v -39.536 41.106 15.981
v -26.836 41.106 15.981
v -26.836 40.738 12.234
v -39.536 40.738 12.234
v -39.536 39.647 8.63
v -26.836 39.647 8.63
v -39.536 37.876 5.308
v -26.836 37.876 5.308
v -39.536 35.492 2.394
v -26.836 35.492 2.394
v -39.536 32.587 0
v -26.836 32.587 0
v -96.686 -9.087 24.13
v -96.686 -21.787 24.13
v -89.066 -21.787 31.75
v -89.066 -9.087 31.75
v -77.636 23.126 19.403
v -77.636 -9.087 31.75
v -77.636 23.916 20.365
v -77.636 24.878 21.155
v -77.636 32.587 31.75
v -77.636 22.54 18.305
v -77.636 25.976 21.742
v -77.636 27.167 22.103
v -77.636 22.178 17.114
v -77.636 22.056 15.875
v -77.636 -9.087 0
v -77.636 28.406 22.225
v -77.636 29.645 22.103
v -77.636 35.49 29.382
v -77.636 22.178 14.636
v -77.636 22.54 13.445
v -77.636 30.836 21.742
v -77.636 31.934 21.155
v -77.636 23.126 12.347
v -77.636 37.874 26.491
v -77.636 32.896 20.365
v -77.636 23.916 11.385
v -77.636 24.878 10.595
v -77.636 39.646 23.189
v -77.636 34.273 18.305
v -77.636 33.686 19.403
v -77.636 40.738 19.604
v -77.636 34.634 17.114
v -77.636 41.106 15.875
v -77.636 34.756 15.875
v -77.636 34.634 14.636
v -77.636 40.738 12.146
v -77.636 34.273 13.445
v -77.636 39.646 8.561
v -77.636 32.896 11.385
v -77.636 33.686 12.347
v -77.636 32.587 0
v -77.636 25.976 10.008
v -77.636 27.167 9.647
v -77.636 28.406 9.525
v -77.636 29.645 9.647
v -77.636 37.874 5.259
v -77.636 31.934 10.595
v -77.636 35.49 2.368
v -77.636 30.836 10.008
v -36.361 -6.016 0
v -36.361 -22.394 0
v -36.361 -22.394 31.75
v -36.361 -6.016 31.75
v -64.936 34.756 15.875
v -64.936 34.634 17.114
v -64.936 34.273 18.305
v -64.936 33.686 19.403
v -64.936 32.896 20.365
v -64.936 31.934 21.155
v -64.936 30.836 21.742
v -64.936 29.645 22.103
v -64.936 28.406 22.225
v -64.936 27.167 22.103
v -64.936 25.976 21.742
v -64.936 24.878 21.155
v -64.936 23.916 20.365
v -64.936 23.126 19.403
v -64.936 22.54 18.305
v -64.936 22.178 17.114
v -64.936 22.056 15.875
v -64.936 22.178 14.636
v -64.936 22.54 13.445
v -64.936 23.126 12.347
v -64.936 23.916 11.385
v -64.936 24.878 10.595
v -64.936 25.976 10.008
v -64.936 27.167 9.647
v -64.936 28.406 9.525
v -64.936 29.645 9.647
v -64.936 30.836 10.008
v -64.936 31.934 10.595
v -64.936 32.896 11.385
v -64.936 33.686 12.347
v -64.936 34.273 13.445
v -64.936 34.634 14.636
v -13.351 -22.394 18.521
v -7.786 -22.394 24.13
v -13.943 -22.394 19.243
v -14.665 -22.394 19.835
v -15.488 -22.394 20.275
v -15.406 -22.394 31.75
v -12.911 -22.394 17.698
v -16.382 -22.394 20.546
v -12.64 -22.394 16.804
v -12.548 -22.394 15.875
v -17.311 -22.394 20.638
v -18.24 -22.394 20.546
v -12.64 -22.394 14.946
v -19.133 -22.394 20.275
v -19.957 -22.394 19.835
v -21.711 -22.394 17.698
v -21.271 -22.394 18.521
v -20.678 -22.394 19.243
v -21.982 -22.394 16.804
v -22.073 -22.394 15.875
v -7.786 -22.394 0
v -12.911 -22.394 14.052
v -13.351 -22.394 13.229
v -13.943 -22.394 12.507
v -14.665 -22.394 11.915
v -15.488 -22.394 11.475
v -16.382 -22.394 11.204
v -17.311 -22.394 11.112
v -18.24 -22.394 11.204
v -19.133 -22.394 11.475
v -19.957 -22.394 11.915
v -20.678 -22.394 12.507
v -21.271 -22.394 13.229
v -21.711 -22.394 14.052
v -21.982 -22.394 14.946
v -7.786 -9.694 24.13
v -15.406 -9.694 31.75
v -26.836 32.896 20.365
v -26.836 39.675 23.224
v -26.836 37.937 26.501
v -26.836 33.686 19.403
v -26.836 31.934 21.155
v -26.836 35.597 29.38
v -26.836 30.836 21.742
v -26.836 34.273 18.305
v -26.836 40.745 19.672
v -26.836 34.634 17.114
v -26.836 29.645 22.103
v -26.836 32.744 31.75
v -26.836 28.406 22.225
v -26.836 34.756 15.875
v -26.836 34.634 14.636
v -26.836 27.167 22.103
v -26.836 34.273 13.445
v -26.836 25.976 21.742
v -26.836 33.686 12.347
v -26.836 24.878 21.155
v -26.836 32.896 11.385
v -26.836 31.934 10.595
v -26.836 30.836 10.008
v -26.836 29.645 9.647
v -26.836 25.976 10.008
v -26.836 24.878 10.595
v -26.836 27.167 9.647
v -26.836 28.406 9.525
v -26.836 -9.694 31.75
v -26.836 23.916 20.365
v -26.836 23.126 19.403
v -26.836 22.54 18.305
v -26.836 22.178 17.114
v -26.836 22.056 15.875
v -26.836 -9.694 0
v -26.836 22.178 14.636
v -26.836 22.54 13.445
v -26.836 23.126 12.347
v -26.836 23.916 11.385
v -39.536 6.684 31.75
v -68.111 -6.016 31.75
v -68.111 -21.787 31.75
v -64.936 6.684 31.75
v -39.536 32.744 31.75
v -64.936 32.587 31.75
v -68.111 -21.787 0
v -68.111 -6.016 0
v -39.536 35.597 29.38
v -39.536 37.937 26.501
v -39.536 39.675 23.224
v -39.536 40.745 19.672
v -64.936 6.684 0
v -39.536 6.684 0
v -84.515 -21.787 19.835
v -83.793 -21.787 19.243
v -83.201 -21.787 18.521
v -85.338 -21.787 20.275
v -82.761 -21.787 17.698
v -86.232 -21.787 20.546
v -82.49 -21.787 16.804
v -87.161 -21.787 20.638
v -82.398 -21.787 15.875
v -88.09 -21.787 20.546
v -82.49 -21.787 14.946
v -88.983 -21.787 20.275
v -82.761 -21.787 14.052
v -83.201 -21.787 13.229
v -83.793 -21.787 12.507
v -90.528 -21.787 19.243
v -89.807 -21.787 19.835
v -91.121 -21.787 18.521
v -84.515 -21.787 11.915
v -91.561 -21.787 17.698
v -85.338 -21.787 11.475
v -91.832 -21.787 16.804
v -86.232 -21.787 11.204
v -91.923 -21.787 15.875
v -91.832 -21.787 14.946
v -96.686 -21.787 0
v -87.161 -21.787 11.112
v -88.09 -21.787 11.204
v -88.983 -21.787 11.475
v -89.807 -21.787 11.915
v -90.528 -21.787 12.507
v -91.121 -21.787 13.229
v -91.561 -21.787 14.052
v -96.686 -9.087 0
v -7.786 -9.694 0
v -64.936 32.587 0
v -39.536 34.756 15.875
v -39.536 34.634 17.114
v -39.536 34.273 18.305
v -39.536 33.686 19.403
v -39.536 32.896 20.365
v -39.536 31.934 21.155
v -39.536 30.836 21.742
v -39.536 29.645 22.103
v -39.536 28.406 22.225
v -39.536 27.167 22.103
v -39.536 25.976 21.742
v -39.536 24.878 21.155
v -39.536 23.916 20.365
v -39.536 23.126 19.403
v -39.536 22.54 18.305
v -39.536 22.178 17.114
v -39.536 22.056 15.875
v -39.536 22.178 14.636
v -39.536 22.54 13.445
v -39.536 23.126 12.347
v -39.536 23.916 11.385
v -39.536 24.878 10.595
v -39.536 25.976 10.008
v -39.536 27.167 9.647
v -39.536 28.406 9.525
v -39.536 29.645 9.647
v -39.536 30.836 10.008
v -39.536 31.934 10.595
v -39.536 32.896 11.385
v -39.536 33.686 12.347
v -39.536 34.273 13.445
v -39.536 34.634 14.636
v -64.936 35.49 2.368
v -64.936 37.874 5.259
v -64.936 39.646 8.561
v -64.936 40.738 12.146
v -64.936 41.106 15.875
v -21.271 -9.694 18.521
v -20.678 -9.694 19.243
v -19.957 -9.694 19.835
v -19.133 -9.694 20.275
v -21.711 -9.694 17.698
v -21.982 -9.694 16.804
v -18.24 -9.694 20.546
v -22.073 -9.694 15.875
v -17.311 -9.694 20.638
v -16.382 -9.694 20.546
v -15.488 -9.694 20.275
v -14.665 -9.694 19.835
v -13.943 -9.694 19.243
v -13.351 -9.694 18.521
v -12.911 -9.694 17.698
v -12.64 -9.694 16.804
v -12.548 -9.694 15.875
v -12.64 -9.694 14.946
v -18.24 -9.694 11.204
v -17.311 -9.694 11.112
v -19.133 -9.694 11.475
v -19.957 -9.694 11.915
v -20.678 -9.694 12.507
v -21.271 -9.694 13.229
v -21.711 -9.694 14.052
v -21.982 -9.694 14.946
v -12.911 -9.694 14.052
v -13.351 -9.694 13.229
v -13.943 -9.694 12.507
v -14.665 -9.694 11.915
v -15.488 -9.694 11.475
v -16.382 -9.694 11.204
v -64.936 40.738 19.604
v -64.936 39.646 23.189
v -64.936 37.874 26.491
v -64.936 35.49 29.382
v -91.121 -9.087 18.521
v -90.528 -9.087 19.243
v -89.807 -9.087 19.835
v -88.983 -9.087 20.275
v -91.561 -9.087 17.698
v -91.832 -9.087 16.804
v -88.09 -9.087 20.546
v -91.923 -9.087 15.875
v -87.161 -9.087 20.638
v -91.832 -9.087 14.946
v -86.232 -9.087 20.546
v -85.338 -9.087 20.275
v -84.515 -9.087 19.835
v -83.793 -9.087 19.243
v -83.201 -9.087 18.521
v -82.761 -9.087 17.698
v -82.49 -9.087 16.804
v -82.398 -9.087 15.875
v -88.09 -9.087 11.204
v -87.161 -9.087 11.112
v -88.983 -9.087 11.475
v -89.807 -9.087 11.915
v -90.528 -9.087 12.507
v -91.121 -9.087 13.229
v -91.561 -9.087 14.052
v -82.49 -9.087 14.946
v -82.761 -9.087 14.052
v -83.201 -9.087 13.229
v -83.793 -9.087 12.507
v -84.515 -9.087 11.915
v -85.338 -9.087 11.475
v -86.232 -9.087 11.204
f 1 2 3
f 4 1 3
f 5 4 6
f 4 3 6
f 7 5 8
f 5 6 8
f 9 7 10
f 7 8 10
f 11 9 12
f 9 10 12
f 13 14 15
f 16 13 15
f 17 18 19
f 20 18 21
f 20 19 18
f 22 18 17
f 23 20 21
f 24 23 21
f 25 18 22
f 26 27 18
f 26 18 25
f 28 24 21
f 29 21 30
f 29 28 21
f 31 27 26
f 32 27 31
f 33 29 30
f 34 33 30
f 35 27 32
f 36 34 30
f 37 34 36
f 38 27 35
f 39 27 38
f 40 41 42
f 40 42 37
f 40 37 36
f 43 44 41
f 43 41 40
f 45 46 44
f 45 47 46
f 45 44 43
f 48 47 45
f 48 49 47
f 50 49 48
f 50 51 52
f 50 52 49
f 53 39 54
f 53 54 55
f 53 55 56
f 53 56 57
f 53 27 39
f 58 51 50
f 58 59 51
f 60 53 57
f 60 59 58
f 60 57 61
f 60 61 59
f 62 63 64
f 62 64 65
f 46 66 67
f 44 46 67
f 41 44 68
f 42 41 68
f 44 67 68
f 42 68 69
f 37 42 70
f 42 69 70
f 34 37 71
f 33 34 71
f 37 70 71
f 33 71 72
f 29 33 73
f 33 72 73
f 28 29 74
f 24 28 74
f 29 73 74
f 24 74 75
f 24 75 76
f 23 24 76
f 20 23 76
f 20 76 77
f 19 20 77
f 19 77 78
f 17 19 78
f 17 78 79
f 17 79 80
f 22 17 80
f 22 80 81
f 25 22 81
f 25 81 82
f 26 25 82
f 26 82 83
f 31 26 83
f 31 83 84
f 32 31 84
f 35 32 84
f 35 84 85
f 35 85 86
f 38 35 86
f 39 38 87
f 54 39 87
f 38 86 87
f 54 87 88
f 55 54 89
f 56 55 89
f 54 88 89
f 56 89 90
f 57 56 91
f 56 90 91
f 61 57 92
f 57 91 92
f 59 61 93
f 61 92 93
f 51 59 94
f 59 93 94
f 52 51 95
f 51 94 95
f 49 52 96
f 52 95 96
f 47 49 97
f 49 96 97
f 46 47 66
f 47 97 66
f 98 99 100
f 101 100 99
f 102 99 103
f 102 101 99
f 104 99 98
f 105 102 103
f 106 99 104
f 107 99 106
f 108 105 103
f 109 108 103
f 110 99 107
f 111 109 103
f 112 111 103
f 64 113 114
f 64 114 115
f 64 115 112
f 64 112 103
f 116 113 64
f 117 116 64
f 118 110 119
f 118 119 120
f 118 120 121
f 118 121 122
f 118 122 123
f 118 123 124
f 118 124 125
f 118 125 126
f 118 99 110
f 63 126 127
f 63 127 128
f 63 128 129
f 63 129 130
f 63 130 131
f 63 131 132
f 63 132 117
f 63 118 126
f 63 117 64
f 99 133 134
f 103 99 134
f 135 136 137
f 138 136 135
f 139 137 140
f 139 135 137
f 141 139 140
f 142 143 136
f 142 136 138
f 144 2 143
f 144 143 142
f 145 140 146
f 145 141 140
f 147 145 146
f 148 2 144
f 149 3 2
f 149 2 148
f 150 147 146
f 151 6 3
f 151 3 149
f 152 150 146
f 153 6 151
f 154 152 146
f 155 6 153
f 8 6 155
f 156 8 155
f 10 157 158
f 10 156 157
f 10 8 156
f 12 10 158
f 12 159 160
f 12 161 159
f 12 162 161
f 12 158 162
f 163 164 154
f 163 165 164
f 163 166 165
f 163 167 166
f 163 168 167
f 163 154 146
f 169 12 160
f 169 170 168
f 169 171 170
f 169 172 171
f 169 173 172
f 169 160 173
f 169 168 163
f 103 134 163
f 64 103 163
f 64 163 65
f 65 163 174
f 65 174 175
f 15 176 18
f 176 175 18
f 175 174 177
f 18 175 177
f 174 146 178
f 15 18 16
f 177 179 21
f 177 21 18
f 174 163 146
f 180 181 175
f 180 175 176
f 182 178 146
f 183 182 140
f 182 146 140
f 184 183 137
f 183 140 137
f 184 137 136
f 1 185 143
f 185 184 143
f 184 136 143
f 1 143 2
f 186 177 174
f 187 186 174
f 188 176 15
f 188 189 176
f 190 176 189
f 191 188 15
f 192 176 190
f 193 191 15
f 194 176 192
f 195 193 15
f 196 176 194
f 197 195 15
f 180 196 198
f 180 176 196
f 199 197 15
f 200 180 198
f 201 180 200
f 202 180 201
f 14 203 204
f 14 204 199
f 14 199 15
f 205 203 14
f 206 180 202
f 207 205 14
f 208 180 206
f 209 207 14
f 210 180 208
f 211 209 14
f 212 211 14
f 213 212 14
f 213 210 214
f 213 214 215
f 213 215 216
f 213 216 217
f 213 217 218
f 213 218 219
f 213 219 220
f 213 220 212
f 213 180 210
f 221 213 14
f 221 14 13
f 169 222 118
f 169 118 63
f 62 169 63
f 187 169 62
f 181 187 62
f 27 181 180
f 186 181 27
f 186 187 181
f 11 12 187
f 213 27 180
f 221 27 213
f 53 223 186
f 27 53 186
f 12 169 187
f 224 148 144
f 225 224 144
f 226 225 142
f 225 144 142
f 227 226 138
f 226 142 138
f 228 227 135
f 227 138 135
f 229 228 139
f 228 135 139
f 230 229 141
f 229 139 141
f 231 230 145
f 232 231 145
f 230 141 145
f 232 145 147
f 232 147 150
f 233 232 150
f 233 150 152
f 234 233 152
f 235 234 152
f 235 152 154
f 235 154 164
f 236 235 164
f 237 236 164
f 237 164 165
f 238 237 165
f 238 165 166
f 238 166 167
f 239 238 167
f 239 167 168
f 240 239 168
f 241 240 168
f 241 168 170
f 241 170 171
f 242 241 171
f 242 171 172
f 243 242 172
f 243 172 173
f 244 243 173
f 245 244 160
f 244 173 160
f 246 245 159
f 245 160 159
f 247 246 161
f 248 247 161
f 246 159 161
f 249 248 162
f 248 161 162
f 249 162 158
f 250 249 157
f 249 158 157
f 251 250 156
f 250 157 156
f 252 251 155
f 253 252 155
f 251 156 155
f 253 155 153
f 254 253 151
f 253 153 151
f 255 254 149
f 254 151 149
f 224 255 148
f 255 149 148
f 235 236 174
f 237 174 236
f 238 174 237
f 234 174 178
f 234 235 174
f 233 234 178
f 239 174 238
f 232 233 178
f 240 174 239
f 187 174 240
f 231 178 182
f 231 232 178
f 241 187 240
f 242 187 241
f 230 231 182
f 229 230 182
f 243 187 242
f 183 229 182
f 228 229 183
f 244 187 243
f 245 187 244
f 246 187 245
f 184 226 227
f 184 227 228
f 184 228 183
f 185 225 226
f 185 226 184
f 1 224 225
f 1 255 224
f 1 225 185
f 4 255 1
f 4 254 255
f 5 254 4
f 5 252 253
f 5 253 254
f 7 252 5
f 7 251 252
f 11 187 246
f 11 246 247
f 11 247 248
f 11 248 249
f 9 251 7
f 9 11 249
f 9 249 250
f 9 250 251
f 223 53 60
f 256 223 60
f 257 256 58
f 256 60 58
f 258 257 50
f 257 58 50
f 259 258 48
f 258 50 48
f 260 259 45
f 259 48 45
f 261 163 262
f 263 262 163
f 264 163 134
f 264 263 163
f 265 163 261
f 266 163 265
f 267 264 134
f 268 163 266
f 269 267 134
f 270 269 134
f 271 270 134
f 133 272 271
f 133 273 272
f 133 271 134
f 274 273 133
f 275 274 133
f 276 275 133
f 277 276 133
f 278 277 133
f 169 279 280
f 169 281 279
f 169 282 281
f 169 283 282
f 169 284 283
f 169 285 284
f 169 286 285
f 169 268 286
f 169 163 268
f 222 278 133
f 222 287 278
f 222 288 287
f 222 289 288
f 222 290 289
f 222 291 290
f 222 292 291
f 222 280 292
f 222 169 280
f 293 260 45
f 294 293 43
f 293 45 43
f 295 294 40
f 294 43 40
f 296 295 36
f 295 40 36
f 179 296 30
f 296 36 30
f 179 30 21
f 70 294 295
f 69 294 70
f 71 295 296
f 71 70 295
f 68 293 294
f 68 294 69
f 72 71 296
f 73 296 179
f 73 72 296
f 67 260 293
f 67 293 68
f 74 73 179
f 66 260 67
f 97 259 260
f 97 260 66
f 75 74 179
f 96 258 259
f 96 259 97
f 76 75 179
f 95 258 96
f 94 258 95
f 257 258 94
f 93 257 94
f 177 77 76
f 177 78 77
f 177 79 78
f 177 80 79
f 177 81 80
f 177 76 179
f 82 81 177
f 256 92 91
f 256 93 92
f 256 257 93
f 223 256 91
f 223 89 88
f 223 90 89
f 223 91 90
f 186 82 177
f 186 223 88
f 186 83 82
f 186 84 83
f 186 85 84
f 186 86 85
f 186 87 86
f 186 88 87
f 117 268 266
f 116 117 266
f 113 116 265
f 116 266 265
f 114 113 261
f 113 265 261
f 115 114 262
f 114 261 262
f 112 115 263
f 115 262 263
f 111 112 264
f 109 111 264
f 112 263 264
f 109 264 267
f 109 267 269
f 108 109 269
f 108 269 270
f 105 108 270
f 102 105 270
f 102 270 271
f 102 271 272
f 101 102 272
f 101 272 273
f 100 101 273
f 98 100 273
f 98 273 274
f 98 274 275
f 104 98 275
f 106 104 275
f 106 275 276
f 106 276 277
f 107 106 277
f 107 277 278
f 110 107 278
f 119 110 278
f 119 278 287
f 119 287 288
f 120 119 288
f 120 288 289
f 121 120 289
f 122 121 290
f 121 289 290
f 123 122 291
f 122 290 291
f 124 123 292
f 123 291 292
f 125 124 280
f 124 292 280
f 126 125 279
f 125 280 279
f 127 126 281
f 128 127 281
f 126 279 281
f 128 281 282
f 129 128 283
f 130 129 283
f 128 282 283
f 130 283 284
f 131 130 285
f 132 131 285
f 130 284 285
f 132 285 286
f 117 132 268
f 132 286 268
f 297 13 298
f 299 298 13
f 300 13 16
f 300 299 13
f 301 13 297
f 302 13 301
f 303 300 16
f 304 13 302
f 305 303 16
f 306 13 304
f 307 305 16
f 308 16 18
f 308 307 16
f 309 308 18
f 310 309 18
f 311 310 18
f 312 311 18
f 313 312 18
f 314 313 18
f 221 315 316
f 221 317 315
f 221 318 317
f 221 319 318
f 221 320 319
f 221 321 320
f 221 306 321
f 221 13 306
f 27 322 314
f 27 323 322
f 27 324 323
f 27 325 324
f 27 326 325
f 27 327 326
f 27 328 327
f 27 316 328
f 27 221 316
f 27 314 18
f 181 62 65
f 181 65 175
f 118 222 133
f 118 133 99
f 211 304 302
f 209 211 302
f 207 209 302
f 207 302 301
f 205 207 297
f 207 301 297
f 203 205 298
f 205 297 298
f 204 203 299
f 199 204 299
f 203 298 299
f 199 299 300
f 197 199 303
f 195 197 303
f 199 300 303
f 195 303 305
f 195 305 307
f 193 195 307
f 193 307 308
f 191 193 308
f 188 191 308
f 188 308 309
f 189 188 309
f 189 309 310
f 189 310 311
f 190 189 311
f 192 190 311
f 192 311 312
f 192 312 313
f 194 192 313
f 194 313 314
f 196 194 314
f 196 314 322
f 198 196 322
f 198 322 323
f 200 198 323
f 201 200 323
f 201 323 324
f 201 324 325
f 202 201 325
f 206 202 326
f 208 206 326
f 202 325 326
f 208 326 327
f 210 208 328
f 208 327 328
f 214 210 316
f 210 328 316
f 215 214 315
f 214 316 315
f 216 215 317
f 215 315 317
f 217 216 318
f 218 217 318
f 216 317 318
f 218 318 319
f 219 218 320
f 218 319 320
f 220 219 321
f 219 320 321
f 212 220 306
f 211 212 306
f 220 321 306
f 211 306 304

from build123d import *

# Parameters (mm, degrees)
BOSS_EXTRUDE1_DEPTH      = 31.75
CUT_EXTRUDE2_DEPTH       = 115.012526534
CUT_EXTRUDE2_DEPTH_BACK  = 115.012526534
SKETCH4_R                = 6.35
CUT_EXTRUDE3_DEPTH       = 88.332955112
CUT_EXTRUDE13_DEPTH      = 31.75
CUT_EXTRUDE18_DEPTH      = 25.4
CUT_EXTRUDE22_DEPTH      = 88.332955112
CUT_EXTRUDE22_DEPTH_BACK = 25.4
CUT_EXTRUDE23_DEPTH      = 25.4
SKETCH14_R               = 4.7625
CUT_EXTRUDE24_DEPTH      = 114.470708815
SKETCH15_R               = 4.7625
CUT_EXTRUDE25_DEPTH      = 114.470708815


with BuildPart() as part:
    # Sketch2 → Boss-Extrude1 (new body)
    with BuildSketch(Plane.XY):
        Polygon((-77.635875696, 41.712828345), (-64.935875696, 41.712828345), (-64.935875696, 6.683574613), (-39.535875696, 6.683574613), (-39.535875696, 41.10626118), (-26.835875696, 41.10626118), (-26.835875696, -9.69373882), (-7.785875696, -9.69373882), (-7.785875696, -22.39373882), (-36.360875696, -22.39373882), (-36.360875696, -6.016425387), (-68.110875696, -6.016425387), (-68.110875696, -21.787171655), (-96.685875696, -21.787171655), (-96.685875696, -9.087171655), (-77.635875696, -9.087171655), align=None)
    extrude(amount=BOSS_EXTRUDE1_DEPTH)

    # Sketch3 → Cut-Extrude2 (cut, two sides: drawn at the far end of the back side and taken through both)
    with BuildSketch(Plane(origin=(0, -9.69373882, 0), x_dir=(1, 0, 0), z_dir=(0, 1, 0)).offset(-CUT_EXTRUDE2_DEPTH_BACK)):
        Polygon((-96.685875696, -24.13), (-89.065875696, -31.75), (-96.685875696, -31.75), align=None)
        Polygon((-15.405875696, -31.75), (-7.785875696, -31.75), (-7.785875696, -24.13), align=None)
    extrude(amount=CUT_EXTRUDE2_DEPTH + CUT_EXTRUDE2_DEPTH_BACK, mode=Mode.SUBTRACT)

    # Sketch4 → Cut-Extrude3 (cut, through all)
    with BuildSketch(Plane(origin=(-26.835875696, 0, 0), x_dir=(0, 0, -1), z_dir=(1, 0, 0))):
        with Locations(Location((-15.875, 28.40626118, 0), (0, 0, 90))):
            Circle(SKETCH4_R)
    extrude(amount=-CUT_EXTRUDE3_DEPTH, mode=Mode.SUBTRACT)

    # Sketch9 → Cut-Extrude13 (cut)
    with BuildSketch(Plane(origin=(-26.835875696, 0, 0), x_dir=(0, 0, -1), z_dir=(1, 0, 0))):
        with BuildLine():
            Line((-31.75, 41.10626118), (-31.75, 32.743943383))
            ThreePointArc((-31.75, 32.743943383), (-24.905282657, 38.886336135), (-15.980537449, 41.10626118))
            Line((-15.980537449, 41.10626118), (-31.75, 41.10626118))
        make_face()
    extrude(amount=-CUT_EXTRUDE13_DEPTH, mode=Mode.SUBTRACT)

    # Sketch10 → Cut-Extrude18 (cut)
    with BuildSketch(Plane(origin=(-26.835875696, 0, 0), x_dir=(0, 0, -1), z_dir=(1, 0, 0))):
        with BuildLine():
            Line((0, 32.58654489), (0, 41.10626118))
            Line((0, 41.10626118), (-15.980537449, 41.10626118))
            ThreePointArc((-15.980537449, 41.10626118), (-6.9256611, 38.843300754), (0, 32.58654489))
        make_face()
    extrude(amount=-CUT_EXTRUDE18_DEPTH, mode=Mode.SUBTRACT)

    # Sketch11 → Cut-Extrude22 (cut, two sides: drawn at the far end of the back side and taken through both)
    with BuildSketch(Plane.ZY.offset(77.635875696).offset(-CUT_EXTRUDE22_DEPTH_BACK)):
        Polygon((-151.990316571, 41.10626118), (0, 41.10626118), (31.75, 41.10626118), (183.740316571, 41.10626118), (183.740316571, 345.086894323), (-151.990316571, 345.086894323), align=None)
    extrude(amount=CUT_EXTRUDE22_DEPTH + CUT_EXTRUDE22_DEPTH_BACK, mode=Mode.SUBTRACT)

    # Sketch13 → Cut-Extrude23 (cut)
    with BuildSketch(Plane.ZY.offset(77.635875696)):
        with BuildLine():
            Line((31.75, 41.10626118), (15.875, 41.10626118))
            ThreePointArc((15.875, 41.10626118), (24.883346001, 38.841737114), (31.75, 32.58654489))
            Line((31.75, 32.58654489), (31.75, 41.10626118))
        make_face()
        with BuildLine():
            Line((15.875, 41.10626118), (0, 41.10626118))
            Line((0, 41.10626118), (0, 32.58654489))
            ThreePointArc((0, 32.58654489), (6.866653999, 38.841737114), (15.875, 41.10626118))
        make_face()
    extrude(amount=-CUT_EXTRUDE23_DEPTH, mode=Mode.SUBTRACT)

    # Sketch14 → Cut-Extrude24 (cut, through all)
    with BuildSketch(Plane(origin=(0, -9.087171655, 0), x_dir=(1, 0, 0), z_dir=(0, 1, 0))):
        with Locations(Location((-17.310875696, -15.875, 0), (0, 0, 180))):
            Circle(SKETCH14_R)
    extrude(amount=-CUT_EXTRUDE24_DEPTH, mode=Mode.SUBTRACT)

    # Sketch15 → Cut-Extrude25 (cut, through all)
    with BuildSketch(Plane(origin=(0, -9.087171655, 0), x_dir=(1, 0, 0), z_dir=(0, 1, 0))):
        with Locations(Location((-87.160875696, -15.875, 0), (0, 0, 180))):
            Circle(SKETCH15_R)
    extrude(amount=-CUT_EXTRUDE25_DEPTH, mode=Mode.SUBTRACT)


solid = part.part
